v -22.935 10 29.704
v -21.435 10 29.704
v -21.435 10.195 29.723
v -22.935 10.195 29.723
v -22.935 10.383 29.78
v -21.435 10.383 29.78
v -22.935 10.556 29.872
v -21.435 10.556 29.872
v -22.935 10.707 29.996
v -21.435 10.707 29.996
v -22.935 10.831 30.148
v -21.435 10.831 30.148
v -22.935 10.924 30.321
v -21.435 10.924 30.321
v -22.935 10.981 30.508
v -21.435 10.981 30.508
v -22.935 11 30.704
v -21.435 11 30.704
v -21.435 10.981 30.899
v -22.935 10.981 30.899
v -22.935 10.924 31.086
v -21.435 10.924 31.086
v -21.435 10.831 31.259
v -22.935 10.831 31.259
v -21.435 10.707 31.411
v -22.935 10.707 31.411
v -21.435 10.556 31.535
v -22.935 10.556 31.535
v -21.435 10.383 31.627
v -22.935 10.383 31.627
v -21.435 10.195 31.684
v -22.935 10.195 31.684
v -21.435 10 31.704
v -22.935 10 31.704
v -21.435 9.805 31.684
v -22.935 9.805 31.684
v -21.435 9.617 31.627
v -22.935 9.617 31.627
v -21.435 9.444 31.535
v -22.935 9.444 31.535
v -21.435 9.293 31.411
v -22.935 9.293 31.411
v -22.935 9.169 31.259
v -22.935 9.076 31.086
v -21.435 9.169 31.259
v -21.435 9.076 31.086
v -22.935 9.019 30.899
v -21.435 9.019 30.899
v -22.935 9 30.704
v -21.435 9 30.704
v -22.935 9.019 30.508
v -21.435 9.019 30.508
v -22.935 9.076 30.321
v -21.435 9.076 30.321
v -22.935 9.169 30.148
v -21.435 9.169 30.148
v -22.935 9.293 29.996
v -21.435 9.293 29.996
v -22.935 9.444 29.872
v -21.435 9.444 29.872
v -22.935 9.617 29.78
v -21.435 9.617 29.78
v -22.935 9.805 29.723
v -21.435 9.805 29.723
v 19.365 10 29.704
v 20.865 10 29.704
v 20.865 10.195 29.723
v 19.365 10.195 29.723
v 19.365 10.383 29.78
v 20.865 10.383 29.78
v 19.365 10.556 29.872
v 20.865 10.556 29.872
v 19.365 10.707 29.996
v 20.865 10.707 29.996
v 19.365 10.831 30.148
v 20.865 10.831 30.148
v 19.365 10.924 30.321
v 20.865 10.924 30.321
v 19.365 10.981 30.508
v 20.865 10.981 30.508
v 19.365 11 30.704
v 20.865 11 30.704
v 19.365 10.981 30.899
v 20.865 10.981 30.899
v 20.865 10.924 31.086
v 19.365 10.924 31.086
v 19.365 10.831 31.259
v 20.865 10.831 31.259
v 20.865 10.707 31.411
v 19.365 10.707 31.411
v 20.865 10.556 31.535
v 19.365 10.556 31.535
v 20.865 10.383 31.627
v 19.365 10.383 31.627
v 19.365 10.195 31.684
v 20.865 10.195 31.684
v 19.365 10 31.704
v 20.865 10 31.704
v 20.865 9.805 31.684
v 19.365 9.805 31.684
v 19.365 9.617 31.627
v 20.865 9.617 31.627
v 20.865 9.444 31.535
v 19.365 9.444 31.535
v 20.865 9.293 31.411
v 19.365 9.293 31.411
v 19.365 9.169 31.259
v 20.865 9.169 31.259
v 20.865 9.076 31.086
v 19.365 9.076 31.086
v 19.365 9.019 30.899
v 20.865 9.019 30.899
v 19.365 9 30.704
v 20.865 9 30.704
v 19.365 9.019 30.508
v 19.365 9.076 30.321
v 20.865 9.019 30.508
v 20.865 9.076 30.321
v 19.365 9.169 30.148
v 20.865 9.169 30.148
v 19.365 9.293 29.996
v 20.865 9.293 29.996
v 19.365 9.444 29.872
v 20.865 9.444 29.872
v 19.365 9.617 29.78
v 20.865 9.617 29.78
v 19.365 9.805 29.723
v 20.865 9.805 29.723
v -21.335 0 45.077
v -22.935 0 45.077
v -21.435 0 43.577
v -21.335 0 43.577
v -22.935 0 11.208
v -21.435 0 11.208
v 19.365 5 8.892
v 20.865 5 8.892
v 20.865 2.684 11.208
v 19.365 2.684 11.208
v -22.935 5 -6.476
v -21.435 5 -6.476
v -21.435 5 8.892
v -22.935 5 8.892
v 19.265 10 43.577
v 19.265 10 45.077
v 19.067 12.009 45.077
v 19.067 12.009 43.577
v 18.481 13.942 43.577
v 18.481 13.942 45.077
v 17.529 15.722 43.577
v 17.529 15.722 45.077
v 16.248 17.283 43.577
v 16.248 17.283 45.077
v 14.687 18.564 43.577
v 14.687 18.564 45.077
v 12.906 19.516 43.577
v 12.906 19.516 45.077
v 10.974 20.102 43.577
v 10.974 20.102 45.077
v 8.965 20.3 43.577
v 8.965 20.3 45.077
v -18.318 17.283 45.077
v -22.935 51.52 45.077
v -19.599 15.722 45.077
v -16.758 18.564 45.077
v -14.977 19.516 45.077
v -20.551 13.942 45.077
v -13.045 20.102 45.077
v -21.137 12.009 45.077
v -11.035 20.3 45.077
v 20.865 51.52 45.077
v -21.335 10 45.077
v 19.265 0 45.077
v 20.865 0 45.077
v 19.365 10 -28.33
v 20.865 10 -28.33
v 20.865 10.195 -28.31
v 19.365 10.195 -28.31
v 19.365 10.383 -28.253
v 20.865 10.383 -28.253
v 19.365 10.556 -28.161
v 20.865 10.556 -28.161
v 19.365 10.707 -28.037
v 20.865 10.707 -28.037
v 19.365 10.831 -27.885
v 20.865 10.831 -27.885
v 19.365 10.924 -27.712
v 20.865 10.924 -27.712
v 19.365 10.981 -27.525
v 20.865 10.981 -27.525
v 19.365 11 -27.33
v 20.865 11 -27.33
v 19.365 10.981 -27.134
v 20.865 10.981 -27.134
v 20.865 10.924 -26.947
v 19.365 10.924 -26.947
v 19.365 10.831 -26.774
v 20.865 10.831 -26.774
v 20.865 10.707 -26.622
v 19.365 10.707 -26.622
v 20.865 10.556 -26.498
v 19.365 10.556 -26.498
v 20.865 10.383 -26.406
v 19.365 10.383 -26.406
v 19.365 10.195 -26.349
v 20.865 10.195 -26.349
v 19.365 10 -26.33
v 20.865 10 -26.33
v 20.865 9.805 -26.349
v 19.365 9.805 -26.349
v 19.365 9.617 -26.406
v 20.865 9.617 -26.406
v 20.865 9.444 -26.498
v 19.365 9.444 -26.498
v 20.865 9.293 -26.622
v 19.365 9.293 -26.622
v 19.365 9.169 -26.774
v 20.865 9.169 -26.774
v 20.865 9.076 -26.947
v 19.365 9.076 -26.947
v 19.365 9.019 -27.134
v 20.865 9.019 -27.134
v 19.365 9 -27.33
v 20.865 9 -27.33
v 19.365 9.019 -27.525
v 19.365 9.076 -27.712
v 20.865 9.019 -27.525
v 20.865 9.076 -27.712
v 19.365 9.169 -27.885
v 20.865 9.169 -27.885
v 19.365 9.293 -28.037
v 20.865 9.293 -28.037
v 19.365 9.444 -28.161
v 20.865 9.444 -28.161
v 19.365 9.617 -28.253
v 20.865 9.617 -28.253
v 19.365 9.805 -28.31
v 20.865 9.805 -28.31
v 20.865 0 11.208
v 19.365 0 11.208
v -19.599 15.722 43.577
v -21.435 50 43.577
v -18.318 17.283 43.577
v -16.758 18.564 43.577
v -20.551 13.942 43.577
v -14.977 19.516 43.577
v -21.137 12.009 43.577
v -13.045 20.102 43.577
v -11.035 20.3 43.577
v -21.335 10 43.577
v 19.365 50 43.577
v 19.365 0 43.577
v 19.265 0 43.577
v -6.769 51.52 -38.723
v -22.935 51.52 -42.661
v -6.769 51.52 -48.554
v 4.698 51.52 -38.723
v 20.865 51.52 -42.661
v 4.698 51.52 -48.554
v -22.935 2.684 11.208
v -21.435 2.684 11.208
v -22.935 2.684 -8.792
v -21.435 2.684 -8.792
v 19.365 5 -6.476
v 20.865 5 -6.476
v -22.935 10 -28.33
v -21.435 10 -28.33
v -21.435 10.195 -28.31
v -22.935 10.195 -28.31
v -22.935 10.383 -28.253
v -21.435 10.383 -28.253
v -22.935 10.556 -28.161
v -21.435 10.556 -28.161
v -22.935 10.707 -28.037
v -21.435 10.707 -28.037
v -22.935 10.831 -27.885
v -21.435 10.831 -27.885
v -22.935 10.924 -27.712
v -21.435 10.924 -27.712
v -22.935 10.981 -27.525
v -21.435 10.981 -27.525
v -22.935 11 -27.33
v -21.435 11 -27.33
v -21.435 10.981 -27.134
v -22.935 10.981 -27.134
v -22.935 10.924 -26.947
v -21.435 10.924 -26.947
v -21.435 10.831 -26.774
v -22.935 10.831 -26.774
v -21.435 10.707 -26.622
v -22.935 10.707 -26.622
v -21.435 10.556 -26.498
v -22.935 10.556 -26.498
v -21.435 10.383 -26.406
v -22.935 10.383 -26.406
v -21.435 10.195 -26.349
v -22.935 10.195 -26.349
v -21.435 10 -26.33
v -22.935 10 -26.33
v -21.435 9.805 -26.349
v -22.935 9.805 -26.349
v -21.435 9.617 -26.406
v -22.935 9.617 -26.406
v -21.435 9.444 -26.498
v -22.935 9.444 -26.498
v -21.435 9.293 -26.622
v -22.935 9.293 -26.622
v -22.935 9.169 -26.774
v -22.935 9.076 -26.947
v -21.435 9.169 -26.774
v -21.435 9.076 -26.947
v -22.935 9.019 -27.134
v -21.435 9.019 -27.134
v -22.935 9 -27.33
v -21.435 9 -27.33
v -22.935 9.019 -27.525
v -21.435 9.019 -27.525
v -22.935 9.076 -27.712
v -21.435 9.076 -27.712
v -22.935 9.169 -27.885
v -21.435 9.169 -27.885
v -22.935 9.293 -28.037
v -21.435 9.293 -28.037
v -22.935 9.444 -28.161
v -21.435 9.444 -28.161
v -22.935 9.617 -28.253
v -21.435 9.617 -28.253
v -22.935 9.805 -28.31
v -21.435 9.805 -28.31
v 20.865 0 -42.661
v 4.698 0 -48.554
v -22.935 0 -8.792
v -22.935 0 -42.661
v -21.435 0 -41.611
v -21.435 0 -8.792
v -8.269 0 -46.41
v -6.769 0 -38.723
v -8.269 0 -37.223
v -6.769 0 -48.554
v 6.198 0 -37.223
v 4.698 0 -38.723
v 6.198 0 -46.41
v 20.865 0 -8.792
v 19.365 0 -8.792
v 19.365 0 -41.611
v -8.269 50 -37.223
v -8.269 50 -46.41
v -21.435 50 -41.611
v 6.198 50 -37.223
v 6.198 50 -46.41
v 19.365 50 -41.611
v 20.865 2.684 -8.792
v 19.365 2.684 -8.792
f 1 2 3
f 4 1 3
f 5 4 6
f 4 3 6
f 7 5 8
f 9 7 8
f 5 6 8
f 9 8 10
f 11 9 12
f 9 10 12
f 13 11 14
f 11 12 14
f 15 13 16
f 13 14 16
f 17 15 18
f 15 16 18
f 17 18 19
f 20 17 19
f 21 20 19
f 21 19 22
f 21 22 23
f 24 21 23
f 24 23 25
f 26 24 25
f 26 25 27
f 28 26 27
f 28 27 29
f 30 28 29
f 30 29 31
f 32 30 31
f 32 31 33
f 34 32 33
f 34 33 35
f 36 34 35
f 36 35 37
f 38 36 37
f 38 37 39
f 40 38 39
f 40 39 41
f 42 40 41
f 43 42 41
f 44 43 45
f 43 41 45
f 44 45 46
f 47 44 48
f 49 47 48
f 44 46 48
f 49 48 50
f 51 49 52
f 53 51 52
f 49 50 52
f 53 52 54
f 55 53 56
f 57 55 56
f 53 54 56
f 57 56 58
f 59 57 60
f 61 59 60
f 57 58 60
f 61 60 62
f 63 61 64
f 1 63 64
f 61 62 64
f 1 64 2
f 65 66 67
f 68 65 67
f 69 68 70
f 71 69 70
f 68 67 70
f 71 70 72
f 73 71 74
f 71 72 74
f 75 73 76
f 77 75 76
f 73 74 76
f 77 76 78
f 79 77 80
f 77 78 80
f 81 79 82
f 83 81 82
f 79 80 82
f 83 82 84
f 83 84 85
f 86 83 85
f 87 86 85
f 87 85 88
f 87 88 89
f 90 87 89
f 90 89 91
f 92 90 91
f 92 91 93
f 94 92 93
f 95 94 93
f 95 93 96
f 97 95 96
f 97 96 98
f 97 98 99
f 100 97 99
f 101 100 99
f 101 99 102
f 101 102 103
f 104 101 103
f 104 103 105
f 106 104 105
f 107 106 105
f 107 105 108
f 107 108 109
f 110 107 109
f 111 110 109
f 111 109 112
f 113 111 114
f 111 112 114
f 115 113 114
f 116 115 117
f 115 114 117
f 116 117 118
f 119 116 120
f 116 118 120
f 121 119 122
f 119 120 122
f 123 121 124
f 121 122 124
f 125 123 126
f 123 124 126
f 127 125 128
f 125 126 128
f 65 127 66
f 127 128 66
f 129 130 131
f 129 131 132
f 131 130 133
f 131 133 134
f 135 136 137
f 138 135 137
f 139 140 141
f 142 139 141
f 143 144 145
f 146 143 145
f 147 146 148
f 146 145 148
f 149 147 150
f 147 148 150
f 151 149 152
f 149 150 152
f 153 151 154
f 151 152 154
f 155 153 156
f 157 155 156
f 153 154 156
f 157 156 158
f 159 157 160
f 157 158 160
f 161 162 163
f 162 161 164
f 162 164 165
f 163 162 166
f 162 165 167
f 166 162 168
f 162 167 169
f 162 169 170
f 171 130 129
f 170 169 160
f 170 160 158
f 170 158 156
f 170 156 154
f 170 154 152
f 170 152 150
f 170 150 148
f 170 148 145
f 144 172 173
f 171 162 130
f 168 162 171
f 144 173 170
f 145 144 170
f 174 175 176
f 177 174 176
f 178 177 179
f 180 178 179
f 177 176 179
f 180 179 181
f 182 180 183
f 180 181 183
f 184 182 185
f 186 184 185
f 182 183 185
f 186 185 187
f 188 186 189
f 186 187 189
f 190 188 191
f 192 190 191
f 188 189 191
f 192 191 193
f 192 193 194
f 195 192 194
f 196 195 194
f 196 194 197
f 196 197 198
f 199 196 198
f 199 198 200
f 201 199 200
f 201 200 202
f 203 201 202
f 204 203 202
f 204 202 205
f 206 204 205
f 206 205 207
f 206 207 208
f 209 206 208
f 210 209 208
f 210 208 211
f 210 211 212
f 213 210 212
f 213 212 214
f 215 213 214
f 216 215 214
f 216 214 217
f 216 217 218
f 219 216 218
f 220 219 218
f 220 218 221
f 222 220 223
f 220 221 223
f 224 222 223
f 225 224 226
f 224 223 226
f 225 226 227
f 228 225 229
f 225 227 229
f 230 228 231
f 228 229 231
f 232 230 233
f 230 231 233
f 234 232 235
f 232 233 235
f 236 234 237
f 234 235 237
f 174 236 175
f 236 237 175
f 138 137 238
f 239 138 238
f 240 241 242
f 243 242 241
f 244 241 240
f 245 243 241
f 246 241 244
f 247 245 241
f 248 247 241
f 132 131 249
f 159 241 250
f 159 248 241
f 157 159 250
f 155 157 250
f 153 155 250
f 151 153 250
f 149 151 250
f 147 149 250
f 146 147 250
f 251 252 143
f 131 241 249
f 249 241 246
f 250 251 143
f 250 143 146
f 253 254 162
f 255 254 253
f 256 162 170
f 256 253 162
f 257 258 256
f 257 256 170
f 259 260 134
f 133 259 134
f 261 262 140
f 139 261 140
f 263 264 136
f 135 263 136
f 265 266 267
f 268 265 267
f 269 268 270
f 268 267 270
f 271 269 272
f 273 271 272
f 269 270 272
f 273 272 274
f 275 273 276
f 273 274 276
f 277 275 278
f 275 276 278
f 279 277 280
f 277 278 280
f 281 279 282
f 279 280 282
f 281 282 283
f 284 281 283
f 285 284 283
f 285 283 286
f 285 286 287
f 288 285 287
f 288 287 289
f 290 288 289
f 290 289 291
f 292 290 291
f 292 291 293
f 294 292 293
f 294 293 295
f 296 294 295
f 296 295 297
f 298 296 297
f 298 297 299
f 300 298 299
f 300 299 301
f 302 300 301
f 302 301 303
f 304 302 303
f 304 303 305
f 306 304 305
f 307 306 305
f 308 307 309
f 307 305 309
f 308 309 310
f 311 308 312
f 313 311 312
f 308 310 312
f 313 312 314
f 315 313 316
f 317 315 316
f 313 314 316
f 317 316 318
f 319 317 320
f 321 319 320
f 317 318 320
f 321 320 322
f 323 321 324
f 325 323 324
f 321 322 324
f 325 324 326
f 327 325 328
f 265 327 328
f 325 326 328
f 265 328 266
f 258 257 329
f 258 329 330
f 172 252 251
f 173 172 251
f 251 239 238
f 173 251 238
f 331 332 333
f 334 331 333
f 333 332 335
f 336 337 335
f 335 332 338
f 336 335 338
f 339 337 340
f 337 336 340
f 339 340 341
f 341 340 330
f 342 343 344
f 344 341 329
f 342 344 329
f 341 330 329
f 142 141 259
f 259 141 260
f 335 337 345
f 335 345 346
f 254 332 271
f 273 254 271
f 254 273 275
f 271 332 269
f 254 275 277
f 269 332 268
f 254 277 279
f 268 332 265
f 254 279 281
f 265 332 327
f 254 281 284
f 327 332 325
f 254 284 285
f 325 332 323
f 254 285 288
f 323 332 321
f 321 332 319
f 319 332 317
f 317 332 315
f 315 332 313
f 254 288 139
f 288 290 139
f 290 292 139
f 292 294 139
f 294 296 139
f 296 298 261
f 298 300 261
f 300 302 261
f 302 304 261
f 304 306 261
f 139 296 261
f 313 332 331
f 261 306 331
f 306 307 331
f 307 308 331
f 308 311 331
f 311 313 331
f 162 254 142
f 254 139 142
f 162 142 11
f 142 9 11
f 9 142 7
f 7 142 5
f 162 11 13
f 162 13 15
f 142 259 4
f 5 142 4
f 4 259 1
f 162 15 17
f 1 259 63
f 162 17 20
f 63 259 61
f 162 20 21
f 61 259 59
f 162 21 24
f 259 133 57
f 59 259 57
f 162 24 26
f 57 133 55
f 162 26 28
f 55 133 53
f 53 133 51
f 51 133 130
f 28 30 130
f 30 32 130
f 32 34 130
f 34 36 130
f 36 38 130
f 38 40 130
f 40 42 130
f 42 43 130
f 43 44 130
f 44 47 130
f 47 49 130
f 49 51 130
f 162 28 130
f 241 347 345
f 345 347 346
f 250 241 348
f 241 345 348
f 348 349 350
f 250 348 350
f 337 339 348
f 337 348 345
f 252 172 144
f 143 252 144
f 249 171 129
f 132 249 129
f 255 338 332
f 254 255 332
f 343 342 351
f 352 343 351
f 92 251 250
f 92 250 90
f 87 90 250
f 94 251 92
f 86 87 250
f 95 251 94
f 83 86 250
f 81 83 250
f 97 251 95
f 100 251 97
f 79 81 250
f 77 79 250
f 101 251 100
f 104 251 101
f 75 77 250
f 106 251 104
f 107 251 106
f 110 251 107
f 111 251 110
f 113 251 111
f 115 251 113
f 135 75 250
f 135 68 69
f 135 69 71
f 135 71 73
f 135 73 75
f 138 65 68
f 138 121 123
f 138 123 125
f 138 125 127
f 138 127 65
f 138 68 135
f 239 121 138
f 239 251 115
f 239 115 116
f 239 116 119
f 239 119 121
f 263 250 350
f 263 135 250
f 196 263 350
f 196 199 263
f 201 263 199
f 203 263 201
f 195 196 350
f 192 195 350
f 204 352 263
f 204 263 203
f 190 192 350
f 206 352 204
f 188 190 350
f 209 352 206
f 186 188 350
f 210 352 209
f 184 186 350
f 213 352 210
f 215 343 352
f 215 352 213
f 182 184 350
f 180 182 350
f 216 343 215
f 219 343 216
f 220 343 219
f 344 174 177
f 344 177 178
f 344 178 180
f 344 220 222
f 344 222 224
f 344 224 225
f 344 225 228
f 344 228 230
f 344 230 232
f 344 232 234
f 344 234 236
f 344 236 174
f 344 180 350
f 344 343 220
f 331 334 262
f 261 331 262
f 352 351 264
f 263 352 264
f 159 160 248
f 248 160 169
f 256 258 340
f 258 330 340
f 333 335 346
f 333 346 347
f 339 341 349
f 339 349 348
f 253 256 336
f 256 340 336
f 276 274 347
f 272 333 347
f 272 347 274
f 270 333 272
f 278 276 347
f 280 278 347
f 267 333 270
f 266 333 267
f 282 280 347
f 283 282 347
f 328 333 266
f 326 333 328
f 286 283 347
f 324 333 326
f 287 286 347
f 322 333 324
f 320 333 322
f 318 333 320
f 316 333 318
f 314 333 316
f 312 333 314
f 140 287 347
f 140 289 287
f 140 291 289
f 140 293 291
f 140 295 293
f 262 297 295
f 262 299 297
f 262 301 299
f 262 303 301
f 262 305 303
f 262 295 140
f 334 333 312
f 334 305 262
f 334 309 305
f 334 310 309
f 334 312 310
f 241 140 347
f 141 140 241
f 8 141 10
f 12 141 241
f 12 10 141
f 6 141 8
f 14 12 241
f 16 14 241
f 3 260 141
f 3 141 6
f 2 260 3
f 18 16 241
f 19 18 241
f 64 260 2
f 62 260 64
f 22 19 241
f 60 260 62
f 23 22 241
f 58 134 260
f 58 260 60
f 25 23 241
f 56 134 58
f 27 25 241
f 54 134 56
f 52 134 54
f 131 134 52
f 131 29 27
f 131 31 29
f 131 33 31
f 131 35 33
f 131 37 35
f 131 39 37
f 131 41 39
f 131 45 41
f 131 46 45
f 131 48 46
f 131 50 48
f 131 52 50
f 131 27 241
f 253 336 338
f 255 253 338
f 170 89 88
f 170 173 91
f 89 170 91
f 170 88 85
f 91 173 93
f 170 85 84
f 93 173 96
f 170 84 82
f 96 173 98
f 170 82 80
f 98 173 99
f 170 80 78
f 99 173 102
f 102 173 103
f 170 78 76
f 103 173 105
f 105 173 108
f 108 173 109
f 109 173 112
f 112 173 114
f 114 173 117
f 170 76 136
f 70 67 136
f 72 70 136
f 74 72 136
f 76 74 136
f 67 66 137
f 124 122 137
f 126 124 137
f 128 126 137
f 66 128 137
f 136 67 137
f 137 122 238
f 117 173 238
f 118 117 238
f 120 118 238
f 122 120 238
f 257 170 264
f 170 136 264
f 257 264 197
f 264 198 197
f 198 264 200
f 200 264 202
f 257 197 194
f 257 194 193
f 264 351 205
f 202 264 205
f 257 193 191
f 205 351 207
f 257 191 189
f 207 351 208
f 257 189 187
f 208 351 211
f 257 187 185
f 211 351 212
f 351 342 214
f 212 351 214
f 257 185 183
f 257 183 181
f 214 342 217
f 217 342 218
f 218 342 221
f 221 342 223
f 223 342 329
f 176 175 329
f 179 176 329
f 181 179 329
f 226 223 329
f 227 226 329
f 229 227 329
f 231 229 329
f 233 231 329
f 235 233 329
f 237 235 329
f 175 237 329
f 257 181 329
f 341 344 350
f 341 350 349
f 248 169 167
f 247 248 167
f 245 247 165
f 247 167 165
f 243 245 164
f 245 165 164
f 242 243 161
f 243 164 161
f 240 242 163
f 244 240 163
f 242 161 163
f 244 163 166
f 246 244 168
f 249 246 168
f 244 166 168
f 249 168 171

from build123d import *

# Parameters (mm, degrees)
BOSS_EXTRUDE1_DEPTH = 50
BOSS_EXTRUDE2_DEPTH = 1.52
CUT_EXTRUDE2_DEPTH  = 1.52
SKETCH4_R           = 1
CUT_EXTRUDE8_DEPTH  = 178.52
CUT_EXTRUDE9_DEPTH  = 178.52


with BuildPart() as part:
    # Sketch1 → Boss-Extrude1 (new body)
    with BuildSketch(Plane(origin=(0, 0, 0), x_dir=(1, 0, 0), z_dir=(0, 1, 0))):
        Polygon((-22.935245878, -45.076760645), (20.864754122, -45.076760645), (20.864754122, 42.660744493), (4.698193973, 48.553690828), (4.698193973, 38.723239355), (-6.768685729, 38.723239355), (-6.768685729, 48.553690828), (-22.935245878, 42.660744493), align=None)
        Polygon((-21.435245878, -43.576760645), (19.364754122, -43.576760645), (19.364754122, 41.610970221), (6.198193973, 46.410372917), (6.198193973, 37.223239355), (-8.268685729, 37.223239355), (-8.268685729, 46.410372917), (-21.435245878, 41.610970221), align=None, mode=Mode.SUBTRACT)
    extrude(amount=BOSS_EXTRUDE1_DEPTH)

    # Sketch2 → Boss-Extrude2 (add)
    with BuildSketch(Plane(origin=(0, 50, 0), x_dir=(1, 0, 0), z_dir=(0, 1, 0))):
        Polygon((-22.935245878, 42.660744493), (-22.935245878, -45.076760645), (20.864754122, -45.076760645), (20.864754122, 42.660744493), (4.698193973, 48.553690828), (4.698193973, 38.723239355), (-6.768685729, 38.723239355), (-6.768685729, 48.553690828), align=None)
    extrude(amount=BOSS_EXTRUDE2_DEPTH)

    # Sketch3 → Cut-Extrude2 (cut)
    with BuildSketch(Plane.XY.offset(45.076760645)):
        with BuildLine():
            Line((8.964754122, 20.3), (-11.035245878, 20.3))
            ThreePointArc((-11.035245878, 20.3), (-18.318445724, 17.283199846), (-21.335245878, 10))
            Line((-21.335245878, 10), (-21.335245878, -0.3))
            Line((-21.335245878, -0.3), (19.264754122, -0.3))
            Line((19.264754122, -0.3), (19.264754122, 10))
            ThreePointArc((19.264754122, 10), (16.247953968, 17.283199846), (8.964754122, 20.3))
        make_face()
    extrude(amount=-CUT_EXTRUDE2_DEPTH, mode=Mode.SUBTRACT)

    # Sketch4 → Cut-Extrude8 (cut)
    with BuildSketch(Plane(origin=(20.864754122, 0, 0), x_dir=(0, 0, -1), z_dir=(1, 0, 0))):
        with Locations((-30.703568725, 10)):
            Circle(SKETCH4_R)
        with Locations((27.32955957, 10)):
            Circle(SKETCH4_R)
    extrude(amount=-CUT_EXTRUDE8_DEPTH, mode=Mode.SUBTRACT)

    # Sketch5 → Cut-Extrude9 (cut)
    with BuildSketch(Plane(origin=(20.864754122, 0, 0), x_dir=(0, 0, -1), z_dir=(1, 0, 0))):
        Polygon((-11.208008076, 2.683848394), (-11.208008076, 0), (8.791991924, 0), (8.791991924, 2.683848394), (6.475840318, 5), (-8.89185647, 5), align=None)
    extrude(amount=-CUT_EXTRUDE9_DEPTH, mode=Mode.SUBTRACT)


solid = part.part
